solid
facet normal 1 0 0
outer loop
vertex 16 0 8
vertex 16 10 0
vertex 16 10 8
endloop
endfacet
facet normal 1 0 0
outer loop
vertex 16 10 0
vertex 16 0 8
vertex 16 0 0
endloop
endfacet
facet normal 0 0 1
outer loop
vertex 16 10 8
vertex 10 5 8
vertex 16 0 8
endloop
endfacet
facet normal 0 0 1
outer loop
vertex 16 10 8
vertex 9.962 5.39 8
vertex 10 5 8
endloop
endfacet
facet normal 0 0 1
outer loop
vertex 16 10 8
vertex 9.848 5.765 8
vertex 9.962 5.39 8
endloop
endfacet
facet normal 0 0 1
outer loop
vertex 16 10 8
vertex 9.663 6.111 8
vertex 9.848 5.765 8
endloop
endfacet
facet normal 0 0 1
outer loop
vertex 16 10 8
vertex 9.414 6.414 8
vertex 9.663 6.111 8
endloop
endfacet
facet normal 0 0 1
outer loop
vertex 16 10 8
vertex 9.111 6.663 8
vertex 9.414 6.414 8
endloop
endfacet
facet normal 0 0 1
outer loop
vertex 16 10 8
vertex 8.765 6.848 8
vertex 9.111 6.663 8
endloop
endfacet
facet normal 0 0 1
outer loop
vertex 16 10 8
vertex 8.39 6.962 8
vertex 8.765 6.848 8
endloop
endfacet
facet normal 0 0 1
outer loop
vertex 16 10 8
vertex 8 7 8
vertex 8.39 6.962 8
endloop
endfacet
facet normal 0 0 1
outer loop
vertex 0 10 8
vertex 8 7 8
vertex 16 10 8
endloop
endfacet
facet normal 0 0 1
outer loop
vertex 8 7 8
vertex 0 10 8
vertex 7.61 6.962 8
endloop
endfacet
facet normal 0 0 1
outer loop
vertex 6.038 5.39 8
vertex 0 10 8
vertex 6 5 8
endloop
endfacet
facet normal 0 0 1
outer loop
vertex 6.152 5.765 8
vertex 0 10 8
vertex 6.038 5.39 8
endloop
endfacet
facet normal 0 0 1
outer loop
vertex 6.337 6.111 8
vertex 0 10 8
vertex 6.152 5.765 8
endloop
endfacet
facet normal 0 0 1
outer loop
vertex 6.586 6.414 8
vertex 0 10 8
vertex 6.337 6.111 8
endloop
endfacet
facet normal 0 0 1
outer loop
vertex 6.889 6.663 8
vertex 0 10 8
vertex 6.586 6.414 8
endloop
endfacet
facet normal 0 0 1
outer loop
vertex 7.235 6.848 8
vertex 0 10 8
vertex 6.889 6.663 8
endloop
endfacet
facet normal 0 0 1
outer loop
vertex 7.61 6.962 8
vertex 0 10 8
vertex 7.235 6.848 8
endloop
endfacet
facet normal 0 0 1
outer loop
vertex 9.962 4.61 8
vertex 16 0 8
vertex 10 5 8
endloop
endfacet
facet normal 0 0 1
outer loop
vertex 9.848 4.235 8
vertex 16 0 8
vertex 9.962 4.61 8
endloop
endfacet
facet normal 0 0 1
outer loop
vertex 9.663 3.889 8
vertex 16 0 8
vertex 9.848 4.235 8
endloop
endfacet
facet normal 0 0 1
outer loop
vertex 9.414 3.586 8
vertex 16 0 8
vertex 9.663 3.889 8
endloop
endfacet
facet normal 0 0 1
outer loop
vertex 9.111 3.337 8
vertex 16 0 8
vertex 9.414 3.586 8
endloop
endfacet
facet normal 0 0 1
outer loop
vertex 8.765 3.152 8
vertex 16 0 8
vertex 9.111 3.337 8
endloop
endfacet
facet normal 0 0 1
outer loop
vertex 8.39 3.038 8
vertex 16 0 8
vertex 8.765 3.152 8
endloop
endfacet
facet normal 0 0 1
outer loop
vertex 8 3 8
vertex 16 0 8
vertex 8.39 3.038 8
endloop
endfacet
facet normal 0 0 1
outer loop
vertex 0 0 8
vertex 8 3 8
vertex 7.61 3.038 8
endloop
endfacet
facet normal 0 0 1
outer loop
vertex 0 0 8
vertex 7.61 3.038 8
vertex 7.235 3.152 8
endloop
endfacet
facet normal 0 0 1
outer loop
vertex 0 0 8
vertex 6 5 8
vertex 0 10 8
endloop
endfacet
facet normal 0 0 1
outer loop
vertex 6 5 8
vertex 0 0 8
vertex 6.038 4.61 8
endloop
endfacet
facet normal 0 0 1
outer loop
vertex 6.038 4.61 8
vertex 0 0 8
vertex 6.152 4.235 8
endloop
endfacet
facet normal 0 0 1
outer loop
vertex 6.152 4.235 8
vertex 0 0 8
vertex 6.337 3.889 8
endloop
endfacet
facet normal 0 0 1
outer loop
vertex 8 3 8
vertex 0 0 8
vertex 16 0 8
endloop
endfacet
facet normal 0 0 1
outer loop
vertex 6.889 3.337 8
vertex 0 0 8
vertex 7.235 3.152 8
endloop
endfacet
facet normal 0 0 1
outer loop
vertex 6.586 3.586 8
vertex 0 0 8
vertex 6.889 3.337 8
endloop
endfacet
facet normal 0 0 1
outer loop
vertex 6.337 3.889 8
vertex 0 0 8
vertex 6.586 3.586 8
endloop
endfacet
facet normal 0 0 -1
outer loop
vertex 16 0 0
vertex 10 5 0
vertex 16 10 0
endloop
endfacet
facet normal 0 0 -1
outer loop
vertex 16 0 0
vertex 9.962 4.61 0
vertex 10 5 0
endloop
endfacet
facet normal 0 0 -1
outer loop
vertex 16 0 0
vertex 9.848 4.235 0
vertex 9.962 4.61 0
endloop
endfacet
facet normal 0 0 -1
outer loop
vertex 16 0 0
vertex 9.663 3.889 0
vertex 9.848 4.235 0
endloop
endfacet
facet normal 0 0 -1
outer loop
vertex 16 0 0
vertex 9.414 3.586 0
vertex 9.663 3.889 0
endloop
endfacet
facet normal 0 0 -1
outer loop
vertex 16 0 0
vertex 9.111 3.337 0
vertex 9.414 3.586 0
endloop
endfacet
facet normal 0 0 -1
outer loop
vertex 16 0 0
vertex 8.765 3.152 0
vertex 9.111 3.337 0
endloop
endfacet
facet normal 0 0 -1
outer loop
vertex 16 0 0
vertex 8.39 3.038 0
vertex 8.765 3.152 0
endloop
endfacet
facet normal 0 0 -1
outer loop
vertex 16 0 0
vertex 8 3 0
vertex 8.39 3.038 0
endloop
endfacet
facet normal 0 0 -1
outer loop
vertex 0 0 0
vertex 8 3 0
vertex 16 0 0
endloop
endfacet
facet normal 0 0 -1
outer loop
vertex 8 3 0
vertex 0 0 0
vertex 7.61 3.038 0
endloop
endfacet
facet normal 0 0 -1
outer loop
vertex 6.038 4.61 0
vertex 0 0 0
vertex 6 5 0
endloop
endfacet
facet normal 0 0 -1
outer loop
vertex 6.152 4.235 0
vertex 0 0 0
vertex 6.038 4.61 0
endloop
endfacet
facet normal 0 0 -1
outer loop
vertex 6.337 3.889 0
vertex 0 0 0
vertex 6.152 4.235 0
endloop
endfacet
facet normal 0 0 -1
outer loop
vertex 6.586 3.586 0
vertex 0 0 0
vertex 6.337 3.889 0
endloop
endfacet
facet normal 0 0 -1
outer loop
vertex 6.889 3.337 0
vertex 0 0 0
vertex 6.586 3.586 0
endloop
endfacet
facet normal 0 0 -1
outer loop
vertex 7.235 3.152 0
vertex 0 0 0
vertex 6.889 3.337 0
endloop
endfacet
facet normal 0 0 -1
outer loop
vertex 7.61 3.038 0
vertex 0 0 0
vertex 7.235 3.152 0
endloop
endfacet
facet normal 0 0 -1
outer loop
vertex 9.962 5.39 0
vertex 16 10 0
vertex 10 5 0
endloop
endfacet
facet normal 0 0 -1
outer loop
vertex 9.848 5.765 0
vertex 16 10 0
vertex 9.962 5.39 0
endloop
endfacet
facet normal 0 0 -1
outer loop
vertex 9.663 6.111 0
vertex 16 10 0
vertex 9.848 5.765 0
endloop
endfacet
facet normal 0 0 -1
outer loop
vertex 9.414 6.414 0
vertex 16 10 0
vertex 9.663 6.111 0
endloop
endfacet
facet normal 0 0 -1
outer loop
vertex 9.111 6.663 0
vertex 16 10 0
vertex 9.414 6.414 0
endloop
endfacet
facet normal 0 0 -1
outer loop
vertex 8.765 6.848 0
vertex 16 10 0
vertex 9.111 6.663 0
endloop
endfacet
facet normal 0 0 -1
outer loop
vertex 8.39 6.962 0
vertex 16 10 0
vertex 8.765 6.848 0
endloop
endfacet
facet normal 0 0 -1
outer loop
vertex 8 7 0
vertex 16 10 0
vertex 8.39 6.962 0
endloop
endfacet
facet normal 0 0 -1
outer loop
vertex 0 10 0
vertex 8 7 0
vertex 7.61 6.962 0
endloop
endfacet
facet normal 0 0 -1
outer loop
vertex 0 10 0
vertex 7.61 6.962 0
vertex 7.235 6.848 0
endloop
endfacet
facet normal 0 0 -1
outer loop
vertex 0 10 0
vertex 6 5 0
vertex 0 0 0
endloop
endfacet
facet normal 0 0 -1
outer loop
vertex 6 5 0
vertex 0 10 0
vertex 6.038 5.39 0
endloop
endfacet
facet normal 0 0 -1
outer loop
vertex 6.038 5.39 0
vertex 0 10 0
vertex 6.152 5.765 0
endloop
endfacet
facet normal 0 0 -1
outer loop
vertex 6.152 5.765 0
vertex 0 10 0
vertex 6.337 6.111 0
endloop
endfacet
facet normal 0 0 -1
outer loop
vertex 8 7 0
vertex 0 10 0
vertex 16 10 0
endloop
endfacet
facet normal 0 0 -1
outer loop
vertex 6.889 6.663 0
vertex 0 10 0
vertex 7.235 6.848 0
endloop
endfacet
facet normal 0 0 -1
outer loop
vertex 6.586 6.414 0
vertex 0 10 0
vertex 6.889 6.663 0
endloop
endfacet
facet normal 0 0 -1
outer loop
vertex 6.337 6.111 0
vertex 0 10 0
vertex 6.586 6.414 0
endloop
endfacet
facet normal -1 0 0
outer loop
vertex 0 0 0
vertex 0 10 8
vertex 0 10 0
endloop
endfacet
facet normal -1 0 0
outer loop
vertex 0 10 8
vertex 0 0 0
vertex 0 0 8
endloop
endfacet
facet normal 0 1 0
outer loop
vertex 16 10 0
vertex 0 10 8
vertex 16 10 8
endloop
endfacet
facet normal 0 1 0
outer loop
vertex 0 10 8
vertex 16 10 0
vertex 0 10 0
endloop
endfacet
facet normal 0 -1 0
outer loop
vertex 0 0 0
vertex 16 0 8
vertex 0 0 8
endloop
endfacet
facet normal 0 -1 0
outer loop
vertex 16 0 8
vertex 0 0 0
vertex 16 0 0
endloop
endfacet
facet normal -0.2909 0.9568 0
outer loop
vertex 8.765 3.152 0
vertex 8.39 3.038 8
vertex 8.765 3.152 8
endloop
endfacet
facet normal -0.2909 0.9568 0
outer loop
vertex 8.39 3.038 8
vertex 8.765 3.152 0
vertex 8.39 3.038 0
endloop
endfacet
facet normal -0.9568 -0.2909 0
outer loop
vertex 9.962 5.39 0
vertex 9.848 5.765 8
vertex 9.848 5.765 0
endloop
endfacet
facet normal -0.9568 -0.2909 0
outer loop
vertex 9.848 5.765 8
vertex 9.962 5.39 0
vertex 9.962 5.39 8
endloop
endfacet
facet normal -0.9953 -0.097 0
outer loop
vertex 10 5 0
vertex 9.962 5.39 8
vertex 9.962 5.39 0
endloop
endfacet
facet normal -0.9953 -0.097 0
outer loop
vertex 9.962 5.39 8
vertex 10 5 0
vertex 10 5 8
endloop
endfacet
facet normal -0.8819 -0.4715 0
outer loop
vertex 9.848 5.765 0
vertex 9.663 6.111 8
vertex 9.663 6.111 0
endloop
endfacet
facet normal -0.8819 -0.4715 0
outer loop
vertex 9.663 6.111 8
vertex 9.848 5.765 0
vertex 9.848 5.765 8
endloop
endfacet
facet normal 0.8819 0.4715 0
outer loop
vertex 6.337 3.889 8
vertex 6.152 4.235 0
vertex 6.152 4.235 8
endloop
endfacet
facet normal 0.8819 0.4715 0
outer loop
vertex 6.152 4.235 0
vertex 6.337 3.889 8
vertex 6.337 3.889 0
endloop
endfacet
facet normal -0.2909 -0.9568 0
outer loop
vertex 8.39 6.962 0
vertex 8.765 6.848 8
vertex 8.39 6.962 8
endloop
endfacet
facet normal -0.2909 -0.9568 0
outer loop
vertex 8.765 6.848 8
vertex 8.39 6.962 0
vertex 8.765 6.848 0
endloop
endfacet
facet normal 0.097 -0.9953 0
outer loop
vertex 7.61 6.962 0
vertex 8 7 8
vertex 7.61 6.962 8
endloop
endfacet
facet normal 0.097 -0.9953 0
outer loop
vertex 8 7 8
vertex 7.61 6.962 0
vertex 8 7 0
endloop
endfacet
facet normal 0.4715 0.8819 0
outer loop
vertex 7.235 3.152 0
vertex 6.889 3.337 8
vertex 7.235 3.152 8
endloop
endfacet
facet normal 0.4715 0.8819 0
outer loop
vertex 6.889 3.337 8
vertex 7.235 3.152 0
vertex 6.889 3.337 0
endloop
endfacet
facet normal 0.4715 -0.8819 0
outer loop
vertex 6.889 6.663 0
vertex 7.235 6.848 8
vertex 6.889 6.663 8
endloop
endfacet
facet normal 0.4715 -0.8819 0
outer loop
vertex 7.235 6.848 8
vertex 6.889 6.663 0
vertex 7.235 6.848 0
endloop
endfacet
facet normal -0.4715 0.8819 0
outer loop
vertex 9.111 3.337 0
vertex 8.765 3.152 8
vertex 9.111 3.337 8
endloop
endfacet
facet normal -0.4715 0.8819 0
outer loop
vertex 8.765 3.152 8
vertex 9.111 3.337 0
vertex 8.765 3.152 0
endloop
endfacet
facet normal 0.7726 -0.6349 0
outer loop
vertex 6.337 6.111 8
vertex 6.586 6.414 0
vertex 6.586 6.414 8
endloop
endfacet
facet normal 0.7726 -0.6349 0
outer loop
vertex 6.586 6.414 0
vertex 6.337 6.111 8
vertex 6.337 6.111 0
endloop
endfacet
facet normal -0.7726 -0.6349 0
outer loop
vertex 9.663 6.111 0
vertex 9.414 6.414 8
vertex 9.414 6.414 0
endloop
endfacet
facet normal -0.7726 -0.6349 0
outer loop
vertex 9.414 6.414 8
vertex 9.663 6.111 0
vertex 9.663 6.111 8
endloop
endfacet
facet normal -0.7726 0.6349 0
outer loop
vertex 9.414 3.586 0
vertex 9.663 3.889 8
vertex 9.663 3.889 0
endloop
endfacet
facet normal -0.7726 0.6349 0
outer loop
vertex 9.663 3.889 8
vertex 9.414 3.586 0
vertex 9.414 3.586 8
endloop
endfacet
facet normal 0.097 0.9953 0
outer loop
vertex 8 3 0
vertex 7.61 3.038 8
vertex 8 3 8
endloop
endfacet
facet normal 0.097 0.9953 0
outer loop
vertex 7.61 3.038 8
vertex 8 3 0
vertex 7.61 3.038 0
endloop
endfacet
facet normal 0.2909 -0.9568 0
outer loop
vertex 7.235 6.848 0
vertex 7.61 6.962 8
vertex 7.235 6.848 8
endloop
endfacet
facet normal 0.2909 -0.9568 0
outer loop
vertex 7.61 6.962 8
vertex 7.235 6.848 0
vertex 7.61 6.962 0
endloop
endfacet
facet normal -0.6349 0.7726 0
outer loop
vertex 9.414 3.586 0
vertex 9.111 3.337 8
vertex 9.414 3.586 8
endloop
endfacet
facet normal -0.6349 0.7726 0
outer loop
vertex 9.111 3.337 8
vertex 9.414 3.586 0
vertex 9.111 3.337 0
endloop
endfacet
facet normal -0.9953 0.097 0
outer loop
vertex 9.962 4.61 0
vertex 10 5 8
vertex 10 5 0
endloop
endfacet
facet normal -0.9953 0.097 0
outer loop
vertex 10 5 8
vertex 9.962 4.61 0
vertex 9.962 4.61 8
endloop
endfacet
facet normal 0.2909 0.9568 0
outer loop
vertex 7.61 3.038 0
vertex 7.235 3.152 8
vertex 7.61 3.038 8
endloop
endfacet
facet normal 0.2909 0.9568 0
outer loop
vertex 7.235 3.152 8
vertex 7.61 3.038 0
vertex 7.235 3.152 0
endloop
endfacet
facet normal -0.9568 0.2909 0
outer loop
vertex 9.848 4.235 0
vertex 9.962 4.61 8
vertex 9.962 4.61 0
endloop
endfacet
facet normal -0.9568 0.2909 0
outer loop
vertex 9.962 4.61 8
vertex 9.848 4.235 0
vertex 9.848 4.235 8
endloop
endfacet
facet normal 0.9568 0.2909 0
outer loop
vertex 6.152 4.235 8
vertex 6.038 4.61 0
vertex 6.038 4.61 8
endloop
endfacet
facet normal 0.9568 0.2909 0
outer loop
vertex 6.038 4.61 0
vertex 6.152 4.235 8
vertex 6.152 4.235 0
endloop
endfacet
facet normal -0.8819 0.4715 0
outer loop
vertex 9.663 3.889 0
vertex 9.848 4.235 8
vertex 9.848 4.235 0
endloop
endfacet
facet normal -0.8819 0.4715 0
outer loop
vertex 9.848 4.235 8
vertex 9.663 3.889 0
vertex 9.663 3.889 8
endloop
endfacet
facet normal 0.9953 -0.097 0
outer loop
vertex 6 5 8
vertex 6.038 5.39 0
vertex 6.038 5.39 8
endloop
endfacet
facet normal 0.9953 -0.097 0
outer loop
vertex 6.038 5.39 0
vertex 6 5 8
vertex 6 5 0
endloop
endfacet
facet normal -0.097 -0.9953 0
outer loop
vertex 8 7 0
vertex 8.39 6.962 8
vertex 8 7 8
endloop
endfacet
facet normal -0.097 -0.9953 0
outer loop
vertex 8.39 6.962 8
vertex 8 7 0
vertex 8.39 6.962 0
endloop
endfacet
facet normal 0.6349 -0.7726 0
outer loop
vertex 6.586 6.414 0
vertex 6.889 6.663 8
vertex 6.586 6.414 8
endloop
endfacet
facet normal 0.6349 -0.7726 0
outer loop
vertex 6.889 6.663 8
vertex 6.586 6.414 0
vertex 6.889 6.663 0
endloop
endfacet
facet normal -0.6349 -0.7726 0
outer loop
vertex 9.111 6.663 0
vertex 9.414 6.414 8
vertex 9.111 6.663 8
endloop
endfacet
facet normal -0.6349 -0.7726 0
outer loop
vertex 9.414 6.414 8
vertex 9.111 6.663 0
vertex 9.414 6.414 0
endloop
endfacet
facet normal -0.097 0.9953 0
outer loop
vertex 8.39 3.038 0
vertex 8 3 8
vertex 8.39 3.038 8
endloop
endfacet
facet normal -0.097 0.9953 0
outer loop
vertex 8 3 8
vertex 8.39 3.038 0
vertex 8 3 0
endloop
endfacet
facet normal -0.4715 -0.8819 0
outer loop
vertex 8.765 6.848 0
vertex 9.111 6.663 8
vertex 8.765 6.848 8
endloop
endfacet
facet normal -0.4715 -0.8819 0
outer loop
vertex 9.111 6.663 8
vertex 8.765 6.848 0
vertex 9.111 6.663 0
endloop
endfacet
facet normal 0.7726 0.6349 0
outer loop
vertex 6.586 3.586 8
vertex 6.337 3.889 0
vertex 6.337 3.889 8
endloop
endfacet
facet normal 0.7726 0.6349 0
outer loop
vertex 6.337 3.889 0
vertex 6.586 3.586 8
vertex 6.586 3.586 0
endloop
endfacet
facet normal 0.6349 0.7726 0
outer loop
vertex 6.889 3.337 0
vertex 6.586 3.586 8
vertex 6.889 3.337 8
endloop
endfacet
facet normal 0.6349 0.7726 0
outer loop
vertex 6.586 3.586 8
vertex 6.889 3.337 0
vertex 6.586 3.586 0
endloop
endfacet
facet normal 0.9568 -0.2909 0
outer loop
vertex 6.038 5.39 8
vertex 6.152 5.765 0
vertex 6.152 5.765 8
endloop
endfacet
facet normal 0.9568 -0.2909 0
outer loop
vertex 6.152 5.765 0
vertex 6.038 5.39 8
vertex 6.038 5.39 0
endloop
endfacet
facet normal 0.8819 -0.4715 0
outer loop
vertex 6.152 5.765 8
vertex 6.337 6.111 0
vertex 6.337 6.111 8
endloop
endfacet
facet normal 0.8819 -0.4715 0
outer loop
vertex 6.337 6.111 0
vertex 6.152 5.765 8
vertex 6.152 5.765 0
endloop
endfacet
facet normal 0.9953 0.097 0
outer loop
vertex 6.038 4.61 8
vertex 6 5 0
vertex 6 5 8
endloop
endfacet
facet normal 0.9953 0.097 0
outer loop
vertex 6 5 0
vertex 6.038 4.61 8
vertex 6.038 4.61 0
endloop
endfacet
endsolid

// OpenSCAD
$fn = 32;

// ----------------------------------------------------------------------
// Micro pad: drilled pad, 5-20 mm class
// ----------------------------------------------------------------------

// --- parameters (mm) ---
pad_l = 16;               // pad length, X
pad_w = 10;               // pad width, Y
pad_t = 8;                // pad thickness, Z
hole_d = 4;               // through hole diameter

difference() {
  cube([pad_l, pad_w, pad_t]);
  translate([pad_l / 2, pad_w / 2, -1])
    cylinder(h = pad_t + 2, d = hole_d);
}
